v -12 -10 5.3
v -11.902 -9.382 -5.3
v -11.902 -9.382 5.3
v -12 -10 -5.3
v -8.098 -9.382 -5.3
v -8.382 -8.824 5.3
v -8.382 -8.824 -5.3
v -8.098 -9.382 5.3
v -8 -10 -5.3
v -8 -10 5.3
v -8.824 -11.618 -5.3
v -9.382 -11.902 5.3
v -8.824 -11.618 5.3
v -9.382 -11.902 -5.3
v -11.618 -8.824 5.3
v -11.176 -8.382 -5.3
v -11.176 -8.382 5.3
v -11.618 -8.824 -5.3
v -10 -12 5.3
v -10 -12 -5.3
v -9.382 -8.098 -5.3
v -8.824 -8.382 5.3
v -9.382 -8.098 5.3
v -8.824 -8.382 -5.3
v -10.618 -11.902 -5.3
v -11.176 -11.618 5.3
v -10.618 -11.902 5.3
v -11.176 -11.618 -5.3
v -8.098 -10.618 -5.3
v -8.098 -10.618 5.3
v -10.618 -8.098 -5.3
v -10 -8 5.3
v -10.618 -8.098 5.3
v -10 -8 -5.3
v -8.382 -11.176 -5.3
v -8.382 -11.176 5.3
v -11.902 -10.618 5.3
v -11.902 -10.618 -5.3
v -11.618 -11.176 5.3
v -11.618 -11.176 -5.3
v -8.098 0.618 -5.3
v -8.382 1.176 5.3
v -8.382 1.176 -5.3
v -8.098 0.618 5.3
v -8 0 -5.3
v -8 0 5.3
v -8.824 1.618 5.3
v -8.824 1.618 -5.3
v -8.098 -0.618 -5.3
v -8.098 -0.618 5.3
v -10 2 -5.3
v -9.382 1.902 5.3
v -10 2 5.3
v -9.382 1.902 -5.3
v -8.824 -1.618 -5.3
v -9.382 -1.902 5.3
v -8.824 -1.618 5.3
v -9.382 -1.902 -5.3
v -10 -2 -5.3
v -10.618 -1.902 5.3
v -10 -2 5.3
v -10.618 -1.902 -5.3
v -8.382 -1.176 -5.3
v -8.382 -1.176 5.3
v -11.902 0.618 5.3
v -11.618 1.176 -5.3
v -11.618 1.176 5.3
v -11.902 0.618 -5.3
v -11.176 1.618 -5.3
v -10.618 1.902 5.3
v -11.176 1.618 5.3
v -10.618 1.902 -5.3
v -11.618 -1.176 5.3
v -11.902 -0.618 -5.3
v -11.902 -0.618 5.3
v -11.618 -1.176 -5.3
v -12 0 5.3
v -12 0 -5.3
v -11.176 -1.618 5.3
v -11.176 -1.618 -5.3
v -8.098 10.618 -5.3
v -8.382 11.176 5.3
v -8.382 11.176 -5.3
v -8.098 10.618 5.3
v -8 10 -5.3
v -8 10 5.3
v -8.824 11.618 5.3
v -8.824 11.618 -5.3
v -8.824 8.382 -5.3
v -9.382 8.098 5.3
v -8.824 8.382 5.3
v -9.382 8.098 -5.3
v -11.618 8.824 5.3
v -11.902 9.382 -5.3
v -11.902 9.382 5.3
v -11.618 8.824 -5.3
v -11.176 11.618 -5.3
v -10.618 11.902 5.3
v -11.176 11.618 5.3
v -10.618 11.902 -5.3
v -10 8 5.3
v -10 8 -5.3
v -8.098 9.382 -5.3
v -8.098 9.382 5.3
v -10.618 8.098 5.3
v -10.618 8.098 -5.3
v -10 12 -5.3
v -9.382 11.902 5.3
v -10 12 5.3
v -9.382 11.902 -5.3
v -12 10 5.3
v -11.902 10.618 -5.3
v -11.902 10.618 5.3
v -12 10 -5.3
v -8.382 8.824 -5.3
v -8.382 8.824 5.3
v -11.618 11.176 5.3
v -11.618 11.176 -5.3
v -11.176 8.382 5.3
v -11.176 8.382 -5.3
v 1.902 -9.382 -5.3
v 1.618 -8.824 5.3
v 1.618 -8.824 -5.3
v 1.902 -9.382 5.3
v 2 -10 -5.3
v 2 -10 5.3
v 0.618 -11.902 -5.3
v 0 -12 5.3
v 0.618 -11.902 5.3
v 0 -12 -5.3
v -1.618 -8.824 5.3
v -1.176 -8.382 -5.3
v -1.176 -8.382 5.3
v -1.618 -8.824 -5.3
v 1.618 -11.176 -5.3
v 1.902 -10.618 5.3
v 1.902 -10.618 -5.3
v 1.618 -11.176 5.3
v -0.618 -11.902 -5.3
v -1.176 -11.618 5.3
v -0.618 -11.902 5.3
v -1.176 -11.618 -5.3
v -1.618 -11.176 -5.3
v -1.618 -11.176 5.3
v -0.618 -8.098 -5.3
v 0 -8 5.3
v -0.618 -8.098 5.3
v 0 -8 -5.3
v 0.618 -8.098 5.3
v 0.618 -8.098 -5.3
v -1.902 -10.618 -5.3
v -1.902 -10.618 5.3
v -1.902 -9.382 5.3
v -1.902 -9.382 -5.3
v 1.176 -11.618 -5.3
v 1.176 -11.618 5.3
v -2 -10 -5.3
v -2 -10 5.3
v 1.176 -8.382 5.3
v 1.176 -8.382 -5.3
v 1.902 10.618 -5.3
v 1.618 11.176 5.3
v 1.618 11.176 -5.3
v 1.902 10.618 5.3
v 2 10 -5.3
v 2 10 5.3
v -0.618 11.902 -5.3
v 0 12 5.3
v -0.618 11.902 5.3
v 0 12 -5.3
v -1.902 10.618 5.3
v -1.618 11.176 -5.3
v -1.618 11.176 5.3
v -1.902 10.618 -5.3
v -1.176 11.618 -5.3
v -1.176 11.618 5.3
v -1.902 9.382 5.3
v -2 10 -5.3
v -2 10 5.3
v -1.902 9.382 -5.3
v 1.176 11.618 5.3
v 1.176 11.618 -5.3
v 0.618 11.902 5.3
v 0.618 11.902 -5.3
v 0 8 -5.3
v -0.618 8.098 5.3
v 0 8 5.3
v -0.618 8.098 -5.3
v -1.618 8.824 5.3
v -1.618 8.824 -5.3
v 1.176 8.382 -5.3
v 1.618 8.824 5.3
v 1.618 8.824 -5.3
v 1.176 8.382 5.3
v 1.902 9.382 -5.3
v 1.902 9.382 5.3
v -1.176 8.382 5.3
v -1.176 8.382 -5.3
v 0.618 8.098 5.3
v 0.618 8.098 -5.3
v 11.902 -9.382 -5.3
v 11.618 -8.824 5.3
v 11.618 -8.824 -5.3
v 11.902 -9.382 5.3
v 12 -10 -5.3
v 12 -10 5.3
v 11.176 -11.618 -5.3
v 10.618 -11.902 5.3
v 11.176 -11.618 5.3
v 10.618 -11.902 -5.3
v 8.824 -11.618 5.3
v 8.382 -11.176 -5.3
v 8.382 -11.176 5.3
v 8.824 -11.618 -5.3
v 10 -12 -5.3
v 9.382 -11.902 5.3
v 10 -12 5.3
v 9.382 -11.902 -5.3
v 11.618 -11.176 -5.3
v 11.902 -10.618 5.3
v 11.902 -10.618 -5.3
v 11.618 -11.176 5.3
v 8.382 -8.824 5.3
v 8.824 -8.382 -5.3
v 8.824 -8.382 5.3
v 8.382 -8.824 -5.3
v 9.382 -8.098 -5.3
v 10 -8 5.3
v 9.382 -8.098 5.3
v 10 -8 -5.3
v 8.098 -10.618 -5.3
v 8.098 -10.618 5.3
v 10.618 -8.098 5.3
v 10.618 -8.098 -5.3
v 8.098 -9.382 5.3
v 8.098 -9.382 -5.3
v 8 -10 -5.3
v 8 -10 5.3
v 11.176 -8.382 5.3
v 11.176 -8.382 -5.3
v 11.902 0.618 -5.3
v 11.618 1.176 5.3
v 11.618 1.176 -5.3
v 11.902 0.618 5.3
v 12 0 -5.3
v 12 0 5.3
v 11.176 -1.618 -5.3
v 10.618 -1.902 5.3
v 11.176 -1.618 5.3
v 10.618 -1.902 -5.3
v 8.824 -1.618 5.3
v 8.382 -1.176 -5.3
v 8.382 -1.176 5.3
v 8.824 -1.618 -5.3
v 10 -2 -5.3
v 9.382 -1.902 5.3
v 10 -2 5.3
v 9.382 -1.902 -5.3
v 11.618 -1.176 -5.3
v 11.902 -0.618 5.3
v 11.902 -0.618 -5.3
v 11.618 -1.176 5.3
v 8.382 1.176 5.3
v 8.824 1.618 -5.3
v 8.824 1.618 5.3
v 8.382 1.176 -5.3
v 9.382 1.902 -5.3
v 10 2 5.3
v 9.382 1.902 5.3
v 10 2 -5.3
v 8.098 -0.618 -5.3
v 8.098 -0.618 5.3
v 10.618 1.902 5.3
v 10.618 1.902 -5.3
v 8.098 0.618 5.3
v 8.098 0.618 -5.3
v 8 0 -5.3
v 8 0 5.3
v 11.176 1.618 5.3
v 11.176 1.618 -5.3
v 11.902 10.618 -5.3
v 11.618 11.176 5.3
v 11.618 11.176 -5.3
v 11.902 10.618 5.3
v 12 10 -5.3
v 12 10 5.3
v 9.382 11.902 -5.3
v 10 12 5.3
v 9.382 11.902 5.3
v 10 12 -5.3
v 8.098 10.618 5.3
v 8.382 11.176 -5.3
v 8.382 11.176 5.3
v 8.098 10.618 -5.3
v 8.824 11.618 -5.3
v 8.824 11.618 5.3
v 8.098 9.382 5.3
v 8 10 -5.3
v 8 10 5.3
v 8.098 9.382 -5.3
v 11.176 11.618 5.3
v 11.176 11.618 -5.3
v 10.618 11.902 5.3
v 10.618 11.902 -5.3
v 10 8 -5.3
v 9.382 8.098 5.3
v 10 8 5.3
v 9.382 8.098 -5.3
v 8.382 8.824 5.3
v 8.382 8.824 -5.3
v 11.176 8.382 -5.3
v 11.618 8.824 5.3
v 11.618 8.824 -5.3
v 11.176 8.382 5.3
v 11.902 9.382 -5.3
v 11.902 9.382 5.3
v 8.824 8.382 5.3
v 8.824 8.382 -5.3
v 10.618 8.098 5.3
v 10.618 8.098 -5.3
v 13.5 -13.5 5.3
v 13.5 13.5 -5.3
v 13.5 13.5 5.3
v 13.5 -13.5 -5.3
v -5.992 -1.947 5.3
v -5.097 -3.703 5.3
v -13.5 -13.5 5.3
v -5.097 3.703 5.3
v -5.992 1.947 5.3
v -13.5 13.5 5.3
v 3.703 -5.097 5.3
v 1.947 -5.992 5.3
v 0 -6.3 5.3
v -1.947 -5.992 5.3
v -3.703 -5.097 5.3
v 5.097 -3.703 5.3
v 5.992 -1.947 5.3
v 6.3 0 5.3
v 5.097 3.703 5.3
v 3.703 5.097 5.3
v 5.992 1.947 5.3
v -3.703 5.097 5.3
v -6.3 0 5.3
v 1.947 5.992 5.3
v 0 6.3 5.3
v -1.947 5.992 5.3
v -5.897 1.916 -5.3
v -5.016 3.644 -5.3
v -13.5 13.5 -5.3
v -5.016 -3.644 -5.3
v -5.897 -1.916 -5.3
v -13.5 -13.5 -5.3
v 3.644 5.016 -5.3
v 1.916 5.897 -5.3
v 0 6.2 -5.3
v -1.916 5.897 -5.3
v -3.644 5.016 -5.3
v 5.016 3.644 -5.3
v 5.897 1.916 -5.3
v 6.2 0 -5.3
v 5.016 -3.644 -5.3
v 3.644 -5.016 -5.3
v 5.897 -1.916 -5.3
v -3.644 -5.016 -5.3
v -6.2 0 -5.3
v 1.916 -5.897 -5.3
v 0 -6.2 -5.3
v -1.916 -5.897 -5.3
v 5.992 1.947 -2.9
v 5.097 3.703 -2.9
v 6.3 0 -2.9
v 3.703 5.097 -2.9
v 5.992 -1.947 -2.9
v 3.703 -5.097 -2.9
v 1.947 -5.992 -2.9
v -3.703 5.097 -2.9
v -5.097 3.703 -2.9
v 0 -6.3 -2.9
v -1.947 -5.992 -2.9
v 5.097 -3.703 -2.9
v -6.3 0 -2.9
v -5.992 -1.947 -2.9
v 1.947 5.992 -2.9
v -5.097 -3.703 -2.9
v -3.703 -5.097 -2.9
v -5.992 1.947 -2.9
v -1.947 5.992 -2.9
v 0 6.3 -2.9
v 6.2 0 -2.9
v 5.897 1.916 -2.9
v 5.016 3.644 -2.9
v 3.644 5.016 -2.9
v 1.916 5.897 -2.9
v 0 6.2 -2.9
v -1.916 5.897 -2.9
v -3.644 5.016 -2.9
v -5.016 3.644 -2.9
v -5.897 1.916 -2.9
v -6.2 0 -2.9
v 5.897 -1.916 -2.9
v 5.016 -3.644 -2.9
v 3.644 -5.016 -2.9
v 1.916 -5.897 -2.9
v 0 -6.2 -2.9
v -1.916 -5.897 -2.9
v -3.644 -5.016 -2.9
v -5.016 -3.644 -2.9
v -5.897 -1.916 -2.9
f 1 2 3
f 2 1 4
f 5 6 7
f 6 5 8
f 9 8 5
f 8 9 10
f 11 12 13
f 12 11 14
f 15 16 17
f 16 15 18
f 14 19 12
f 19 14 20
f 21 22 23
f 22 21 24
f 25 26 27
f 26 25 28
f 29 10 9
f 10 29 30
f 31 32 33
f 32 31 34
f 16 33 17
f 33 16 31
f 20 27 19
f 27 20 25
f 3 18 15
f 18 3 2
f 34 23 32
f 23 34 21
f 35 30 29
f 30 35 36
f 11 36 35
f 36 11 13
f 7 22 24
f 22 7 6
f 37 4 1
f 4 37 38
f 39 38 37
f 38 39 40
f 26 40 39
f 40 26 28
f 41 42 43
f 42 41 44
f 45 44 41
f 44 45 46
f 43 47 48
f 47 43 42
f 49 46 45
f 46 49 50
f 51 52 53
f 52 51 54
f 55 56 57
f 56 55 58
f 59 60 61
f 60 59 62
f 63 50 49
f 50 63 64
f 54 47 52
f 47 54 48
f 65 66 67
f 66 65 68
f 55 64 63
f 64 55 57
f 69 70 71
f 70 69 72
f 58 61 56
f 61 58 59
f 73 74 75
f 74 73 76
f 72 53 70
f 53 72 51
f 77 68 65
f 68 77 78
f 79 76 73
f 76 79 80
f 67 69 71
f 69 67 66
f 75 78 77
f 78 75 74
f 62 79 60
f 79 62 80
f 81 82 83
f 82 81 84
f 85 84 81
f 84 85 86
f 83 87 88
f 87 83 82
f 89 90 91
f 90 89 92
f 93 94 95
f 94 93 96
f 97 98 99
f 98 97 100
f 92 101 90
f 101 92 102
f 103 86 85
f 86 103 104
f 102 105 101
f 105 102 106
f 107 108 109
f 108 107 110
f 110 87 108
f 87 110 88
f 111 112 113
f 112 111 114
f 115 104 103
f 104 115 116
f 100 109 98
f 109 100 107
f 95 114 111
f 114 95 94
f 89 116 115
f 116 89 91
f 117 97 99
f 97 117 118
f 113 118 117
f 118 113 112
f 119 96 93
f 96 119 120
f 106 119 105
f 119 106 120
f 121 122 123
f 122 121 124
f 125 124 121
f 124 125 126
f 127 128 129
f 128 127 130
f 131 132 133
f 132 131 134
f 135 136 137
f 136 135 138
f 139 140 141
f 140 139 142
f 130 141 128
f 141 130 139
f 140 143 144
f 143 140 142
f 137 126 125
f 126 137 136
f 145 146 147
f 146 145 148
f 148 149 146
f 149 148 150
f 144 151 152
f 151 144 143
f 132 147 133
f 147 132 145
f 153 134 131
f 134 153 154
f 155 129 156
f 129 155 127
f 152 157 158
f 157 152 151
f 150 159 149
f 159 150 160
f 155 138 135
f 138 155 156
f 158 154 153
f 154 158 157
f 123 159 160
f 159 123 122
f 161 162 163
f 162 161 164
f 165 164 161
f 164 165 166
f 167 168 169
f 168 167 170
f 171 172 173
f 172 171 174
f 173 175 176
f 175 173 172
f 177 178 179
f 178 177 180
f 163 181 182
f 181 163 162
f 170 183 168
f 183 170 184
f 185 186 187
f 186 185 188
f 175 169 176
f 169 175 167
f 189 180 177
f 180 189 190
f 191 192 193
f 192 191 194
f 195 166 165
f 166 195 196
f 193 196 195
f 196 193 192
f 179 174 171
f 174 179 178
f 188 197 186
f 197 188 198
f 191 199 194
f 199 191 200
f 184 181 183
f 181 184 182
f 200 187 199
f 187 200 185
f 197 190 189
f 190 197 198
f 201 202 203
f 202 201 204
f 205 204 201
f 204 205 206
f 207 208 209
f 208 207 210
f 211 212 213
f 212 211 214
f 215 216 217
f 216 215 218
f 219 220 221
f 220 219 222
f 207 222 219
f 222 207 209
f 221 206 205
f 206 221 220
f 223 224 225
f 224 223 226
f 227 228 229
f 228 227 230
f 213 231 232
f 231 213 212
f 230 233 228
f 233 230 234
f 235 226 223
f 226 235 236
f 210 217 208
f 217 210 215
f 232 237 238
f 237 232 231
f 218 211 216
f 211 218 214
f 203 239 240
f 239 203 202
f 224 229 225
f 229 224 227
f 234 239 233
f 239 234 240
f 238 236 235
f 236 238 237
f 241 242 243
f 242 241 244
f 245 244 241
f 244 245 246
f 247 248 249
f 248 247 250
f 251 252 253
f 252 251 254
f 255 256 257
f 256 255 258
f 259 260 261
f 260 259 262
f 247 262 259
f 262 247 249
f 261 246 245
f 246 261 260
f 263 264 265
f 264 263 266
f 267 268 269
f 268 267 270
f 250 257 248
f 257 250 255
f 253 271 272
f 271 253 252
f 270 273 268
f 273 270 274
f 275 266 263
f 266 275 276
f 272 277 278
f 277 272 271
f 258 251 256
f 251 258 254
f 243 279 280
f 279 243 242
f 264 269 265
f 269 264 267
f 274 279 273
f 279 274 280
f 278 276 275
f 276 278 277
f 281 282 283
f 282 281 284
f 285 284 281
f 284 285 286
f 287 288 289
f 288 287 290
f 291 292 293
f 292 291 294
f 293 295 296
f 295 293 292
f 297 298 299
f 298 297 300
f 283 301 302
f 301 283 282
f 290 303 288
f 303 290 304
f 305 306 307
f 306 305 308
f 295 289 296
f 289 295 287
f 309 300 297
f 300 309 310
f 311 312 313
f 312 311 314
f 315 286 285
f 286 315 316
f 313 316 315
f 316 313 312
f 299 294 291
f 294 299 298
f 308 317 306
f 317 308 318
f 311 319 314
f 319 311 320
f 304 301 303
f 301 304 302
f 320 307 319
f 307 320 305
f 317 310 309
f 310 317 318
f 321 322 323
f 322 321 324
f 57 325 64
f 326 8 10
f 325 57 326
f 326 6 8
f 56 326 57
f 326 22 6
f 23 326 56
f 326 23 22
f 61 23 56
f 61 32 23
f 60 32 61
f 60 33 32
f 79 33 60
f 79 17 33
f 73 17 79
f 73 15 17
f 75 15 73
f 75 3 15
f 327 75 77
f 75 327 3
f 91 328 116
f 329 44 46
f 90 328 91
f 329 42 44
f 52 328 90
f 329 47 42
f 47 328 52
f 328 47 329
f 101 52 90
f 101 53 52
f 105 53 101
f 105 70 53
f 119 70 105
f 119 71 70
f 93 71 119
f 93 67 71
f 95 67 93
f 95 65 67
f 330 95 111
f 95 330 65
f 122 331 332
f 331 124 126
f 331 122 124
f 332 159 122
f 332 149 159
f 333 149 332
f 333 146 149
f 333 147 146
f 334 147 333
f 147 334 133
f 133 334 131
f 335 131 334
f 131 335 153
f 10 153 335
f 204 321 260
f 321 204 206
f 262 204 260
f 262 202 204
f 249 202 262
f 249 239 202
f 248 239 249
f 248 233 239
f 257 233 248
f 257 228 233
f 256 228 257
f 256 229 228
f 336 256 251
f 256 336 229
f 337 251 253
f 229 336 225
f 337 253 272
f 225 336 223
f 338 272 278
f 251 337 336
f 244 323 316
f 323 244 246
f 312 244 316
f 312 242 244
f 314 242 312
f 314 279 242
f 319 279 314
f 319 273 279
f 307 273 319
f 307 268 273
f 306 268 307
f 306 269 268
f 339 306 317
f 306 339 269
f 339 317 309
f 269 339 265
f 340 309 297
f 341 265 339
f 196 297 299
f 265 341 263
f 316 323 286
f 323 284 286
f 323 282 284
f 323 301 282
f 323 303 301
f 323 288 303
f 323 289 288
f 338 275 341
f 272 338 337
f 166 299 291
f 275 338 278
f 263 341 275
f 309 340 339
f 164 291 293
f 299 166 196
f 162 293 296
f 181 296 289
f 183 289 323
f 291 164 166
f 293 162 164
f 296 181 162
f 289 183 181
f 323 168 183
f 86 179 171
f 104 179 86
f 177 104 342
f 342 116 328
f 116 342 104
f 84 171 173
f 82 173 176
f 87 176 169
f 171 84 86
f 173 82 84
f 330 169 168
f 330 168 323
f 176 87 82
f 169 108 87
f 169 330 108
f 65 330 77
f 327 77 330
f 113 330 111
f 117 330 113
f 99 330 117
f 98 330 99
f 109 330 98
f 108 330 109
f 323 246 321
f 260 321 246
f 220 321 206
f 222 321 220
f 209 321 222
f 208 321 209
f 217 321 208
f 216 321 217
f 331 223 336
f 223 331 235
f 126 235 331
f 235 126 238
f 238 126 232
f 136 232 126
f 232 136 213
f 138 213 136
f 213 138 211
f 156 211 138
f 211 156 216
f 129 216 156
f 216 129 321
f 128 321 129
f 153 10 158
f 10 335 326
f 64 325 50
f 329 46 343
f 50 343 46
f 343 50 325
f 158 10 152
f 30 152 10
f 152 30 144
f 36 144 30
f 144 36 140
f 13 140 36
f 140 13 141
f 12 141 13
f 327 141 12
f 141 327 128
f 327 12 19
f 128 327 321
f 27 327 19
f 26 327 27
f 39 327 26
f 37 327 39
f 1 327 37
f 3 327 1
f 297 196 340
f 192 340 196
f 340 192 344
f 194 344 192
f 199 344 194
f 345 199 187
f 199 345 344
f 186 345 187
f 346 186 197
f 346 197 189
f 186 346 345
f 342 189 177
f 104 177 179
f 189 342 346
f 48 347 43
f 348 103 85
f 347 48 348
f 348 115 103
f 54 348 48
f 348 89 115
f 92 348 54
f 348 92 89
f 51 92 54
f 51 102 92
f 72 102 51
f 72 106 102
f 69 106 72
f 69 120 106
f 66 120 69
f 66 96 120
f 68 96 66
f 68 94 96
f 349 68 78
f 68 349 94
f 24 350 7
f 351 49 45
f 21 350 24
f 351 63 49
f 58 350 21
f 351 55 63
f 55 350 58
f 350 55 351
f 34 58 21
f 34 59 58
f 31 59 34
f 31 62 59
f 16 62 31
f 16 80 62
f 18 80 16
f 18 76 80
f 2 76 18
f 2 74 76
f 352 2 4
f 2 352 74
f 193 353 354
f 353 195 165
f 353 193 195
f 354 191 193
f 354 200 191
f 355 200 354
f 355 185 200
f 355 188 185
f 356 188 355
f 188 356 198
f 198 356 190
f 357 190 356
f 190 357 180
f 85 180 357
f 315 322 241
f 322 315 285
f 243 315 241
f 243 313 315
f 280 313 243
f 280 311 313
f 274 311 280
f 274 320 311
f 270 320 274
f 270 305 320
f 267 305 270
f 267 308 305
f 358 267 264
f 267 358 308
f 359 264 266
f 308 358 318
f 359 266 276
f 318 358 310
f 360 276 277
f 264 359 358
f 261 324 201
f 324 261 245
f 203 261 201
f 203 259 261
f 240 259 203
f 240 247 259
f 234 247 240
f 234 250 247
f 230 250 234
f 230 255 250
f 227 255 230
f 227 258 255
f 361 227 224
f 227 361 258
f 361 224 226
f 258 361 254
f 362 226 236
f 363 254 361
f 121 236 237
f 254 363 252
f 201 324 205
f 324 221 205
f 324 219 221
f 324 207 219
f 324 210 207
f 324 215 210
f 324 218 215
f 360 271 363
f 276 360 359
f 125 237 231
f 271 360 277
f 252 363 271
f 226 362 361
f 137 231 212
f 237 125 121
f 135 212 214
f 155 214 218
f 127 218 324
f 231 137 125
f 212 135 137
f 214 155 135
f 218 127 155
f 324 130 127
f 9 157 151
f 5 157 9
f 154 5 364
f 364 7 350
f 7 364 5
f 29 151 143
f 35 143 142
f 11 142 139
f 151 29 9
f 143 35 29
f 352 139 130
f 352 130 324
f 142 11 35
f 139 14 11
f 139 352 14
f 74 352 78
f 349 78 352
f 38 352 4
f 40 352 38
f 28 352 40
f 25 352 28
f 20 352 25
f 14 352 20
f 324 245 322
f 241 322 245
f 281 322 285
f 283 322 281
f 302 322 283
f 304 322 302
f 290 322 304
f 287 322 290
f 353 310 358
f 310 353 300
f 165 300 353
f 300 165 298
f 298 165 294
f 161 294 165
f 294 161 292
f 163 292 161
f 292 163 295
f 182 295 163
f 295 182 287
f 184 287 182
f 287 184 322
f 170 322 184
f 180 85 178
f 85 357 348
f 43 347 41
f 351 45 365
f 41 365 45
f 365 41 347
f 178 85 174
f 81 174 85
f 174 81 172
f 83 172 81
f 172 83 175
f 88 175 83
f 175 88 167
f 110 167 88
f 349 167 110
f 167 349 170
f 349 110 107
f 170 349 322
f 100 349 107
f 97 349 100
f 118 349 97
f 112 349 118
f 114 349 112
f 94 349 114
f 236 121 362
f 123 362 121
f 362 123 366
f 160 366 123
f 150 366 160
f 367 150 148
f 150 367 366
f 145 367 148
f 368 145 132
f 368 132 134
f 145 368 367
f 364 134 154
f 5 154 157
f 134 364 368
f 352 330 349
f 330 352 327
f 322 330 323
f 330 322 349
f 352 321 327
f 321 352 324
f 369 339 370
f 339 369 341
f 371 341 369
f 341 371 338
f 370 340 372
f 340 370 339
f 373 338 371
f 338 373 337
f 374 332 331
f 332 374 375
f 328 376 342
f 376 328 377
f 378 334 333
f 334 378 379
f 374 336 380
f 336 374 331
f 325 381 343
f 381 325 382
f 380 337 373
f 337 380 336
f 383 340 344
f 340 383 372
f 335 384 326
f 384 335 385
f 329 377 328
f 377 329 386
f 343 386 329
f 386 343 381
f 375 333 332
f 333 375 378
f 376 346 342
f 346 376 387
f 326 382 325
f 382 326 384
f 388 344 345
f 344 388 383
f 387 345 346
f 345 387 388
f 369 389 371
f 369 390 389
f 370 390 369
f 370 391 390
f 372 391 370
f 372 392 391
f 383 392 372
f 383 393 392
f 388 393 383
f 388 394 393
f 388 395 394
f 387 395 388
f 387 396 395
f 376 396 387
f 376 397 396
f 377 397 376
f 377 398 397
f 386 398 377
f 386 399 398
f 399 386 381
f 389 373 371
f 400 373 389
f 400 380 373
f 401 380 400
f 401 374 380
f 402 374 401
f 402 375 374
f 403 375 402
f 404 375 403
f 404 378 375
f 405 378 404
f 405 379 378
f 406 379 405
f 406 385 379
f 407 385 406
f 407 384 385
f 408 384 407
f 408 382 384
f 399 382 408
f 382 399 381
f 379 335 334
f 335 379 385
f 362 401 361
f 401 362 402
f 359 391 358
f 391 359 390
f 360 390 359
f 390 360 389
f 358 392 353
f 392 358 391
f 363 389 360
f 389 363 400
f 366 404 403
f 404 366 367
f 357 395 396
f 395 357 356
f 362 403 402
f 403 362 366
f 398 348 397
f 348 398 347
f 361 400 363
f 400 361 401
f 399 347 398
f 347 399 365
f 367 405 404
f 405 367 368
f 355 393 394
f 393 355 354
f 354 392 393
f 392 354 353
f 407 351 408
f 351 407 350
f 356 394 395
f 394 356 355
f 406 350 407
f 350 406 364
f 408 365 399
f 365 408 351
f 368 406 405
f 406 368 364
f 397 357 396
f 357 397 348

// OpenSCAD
// holder for 12 bearing with 3x3 plate
$fn = 20;
d_o = 12.0 + 0.6;
d_o1 = 12.0+0.4;
r_ho = 2.0;

z_b = 9;
z_1 = 1.0 + 0.6;
z_a = z_b + z_1;

x_1 = 27;

y_1 = 27;

step_xy = 10;

module m_hole( i, j )
{
  translate([ i*step_xy, j*step_xy,z_1])  cylinder(h=2*z_a, r = r_ho, center = true );
}

module bearing_box()
{
  difference() {
    cube([x_1,y_1,z_a], true );
    translate([0,0,z_1])
      cylinder(h=z_b, r = d_o/2.0, center = true );
    translate([0,0,z_1])
      cylinder(h=2*z_a, r = d_o1/2.0, center = true );

    for( i=[-1:1:1]) {
      for( j=[-1:1:1]) {
        m_hole( i, j );
      }
    };
  }
}

bearing_box();
